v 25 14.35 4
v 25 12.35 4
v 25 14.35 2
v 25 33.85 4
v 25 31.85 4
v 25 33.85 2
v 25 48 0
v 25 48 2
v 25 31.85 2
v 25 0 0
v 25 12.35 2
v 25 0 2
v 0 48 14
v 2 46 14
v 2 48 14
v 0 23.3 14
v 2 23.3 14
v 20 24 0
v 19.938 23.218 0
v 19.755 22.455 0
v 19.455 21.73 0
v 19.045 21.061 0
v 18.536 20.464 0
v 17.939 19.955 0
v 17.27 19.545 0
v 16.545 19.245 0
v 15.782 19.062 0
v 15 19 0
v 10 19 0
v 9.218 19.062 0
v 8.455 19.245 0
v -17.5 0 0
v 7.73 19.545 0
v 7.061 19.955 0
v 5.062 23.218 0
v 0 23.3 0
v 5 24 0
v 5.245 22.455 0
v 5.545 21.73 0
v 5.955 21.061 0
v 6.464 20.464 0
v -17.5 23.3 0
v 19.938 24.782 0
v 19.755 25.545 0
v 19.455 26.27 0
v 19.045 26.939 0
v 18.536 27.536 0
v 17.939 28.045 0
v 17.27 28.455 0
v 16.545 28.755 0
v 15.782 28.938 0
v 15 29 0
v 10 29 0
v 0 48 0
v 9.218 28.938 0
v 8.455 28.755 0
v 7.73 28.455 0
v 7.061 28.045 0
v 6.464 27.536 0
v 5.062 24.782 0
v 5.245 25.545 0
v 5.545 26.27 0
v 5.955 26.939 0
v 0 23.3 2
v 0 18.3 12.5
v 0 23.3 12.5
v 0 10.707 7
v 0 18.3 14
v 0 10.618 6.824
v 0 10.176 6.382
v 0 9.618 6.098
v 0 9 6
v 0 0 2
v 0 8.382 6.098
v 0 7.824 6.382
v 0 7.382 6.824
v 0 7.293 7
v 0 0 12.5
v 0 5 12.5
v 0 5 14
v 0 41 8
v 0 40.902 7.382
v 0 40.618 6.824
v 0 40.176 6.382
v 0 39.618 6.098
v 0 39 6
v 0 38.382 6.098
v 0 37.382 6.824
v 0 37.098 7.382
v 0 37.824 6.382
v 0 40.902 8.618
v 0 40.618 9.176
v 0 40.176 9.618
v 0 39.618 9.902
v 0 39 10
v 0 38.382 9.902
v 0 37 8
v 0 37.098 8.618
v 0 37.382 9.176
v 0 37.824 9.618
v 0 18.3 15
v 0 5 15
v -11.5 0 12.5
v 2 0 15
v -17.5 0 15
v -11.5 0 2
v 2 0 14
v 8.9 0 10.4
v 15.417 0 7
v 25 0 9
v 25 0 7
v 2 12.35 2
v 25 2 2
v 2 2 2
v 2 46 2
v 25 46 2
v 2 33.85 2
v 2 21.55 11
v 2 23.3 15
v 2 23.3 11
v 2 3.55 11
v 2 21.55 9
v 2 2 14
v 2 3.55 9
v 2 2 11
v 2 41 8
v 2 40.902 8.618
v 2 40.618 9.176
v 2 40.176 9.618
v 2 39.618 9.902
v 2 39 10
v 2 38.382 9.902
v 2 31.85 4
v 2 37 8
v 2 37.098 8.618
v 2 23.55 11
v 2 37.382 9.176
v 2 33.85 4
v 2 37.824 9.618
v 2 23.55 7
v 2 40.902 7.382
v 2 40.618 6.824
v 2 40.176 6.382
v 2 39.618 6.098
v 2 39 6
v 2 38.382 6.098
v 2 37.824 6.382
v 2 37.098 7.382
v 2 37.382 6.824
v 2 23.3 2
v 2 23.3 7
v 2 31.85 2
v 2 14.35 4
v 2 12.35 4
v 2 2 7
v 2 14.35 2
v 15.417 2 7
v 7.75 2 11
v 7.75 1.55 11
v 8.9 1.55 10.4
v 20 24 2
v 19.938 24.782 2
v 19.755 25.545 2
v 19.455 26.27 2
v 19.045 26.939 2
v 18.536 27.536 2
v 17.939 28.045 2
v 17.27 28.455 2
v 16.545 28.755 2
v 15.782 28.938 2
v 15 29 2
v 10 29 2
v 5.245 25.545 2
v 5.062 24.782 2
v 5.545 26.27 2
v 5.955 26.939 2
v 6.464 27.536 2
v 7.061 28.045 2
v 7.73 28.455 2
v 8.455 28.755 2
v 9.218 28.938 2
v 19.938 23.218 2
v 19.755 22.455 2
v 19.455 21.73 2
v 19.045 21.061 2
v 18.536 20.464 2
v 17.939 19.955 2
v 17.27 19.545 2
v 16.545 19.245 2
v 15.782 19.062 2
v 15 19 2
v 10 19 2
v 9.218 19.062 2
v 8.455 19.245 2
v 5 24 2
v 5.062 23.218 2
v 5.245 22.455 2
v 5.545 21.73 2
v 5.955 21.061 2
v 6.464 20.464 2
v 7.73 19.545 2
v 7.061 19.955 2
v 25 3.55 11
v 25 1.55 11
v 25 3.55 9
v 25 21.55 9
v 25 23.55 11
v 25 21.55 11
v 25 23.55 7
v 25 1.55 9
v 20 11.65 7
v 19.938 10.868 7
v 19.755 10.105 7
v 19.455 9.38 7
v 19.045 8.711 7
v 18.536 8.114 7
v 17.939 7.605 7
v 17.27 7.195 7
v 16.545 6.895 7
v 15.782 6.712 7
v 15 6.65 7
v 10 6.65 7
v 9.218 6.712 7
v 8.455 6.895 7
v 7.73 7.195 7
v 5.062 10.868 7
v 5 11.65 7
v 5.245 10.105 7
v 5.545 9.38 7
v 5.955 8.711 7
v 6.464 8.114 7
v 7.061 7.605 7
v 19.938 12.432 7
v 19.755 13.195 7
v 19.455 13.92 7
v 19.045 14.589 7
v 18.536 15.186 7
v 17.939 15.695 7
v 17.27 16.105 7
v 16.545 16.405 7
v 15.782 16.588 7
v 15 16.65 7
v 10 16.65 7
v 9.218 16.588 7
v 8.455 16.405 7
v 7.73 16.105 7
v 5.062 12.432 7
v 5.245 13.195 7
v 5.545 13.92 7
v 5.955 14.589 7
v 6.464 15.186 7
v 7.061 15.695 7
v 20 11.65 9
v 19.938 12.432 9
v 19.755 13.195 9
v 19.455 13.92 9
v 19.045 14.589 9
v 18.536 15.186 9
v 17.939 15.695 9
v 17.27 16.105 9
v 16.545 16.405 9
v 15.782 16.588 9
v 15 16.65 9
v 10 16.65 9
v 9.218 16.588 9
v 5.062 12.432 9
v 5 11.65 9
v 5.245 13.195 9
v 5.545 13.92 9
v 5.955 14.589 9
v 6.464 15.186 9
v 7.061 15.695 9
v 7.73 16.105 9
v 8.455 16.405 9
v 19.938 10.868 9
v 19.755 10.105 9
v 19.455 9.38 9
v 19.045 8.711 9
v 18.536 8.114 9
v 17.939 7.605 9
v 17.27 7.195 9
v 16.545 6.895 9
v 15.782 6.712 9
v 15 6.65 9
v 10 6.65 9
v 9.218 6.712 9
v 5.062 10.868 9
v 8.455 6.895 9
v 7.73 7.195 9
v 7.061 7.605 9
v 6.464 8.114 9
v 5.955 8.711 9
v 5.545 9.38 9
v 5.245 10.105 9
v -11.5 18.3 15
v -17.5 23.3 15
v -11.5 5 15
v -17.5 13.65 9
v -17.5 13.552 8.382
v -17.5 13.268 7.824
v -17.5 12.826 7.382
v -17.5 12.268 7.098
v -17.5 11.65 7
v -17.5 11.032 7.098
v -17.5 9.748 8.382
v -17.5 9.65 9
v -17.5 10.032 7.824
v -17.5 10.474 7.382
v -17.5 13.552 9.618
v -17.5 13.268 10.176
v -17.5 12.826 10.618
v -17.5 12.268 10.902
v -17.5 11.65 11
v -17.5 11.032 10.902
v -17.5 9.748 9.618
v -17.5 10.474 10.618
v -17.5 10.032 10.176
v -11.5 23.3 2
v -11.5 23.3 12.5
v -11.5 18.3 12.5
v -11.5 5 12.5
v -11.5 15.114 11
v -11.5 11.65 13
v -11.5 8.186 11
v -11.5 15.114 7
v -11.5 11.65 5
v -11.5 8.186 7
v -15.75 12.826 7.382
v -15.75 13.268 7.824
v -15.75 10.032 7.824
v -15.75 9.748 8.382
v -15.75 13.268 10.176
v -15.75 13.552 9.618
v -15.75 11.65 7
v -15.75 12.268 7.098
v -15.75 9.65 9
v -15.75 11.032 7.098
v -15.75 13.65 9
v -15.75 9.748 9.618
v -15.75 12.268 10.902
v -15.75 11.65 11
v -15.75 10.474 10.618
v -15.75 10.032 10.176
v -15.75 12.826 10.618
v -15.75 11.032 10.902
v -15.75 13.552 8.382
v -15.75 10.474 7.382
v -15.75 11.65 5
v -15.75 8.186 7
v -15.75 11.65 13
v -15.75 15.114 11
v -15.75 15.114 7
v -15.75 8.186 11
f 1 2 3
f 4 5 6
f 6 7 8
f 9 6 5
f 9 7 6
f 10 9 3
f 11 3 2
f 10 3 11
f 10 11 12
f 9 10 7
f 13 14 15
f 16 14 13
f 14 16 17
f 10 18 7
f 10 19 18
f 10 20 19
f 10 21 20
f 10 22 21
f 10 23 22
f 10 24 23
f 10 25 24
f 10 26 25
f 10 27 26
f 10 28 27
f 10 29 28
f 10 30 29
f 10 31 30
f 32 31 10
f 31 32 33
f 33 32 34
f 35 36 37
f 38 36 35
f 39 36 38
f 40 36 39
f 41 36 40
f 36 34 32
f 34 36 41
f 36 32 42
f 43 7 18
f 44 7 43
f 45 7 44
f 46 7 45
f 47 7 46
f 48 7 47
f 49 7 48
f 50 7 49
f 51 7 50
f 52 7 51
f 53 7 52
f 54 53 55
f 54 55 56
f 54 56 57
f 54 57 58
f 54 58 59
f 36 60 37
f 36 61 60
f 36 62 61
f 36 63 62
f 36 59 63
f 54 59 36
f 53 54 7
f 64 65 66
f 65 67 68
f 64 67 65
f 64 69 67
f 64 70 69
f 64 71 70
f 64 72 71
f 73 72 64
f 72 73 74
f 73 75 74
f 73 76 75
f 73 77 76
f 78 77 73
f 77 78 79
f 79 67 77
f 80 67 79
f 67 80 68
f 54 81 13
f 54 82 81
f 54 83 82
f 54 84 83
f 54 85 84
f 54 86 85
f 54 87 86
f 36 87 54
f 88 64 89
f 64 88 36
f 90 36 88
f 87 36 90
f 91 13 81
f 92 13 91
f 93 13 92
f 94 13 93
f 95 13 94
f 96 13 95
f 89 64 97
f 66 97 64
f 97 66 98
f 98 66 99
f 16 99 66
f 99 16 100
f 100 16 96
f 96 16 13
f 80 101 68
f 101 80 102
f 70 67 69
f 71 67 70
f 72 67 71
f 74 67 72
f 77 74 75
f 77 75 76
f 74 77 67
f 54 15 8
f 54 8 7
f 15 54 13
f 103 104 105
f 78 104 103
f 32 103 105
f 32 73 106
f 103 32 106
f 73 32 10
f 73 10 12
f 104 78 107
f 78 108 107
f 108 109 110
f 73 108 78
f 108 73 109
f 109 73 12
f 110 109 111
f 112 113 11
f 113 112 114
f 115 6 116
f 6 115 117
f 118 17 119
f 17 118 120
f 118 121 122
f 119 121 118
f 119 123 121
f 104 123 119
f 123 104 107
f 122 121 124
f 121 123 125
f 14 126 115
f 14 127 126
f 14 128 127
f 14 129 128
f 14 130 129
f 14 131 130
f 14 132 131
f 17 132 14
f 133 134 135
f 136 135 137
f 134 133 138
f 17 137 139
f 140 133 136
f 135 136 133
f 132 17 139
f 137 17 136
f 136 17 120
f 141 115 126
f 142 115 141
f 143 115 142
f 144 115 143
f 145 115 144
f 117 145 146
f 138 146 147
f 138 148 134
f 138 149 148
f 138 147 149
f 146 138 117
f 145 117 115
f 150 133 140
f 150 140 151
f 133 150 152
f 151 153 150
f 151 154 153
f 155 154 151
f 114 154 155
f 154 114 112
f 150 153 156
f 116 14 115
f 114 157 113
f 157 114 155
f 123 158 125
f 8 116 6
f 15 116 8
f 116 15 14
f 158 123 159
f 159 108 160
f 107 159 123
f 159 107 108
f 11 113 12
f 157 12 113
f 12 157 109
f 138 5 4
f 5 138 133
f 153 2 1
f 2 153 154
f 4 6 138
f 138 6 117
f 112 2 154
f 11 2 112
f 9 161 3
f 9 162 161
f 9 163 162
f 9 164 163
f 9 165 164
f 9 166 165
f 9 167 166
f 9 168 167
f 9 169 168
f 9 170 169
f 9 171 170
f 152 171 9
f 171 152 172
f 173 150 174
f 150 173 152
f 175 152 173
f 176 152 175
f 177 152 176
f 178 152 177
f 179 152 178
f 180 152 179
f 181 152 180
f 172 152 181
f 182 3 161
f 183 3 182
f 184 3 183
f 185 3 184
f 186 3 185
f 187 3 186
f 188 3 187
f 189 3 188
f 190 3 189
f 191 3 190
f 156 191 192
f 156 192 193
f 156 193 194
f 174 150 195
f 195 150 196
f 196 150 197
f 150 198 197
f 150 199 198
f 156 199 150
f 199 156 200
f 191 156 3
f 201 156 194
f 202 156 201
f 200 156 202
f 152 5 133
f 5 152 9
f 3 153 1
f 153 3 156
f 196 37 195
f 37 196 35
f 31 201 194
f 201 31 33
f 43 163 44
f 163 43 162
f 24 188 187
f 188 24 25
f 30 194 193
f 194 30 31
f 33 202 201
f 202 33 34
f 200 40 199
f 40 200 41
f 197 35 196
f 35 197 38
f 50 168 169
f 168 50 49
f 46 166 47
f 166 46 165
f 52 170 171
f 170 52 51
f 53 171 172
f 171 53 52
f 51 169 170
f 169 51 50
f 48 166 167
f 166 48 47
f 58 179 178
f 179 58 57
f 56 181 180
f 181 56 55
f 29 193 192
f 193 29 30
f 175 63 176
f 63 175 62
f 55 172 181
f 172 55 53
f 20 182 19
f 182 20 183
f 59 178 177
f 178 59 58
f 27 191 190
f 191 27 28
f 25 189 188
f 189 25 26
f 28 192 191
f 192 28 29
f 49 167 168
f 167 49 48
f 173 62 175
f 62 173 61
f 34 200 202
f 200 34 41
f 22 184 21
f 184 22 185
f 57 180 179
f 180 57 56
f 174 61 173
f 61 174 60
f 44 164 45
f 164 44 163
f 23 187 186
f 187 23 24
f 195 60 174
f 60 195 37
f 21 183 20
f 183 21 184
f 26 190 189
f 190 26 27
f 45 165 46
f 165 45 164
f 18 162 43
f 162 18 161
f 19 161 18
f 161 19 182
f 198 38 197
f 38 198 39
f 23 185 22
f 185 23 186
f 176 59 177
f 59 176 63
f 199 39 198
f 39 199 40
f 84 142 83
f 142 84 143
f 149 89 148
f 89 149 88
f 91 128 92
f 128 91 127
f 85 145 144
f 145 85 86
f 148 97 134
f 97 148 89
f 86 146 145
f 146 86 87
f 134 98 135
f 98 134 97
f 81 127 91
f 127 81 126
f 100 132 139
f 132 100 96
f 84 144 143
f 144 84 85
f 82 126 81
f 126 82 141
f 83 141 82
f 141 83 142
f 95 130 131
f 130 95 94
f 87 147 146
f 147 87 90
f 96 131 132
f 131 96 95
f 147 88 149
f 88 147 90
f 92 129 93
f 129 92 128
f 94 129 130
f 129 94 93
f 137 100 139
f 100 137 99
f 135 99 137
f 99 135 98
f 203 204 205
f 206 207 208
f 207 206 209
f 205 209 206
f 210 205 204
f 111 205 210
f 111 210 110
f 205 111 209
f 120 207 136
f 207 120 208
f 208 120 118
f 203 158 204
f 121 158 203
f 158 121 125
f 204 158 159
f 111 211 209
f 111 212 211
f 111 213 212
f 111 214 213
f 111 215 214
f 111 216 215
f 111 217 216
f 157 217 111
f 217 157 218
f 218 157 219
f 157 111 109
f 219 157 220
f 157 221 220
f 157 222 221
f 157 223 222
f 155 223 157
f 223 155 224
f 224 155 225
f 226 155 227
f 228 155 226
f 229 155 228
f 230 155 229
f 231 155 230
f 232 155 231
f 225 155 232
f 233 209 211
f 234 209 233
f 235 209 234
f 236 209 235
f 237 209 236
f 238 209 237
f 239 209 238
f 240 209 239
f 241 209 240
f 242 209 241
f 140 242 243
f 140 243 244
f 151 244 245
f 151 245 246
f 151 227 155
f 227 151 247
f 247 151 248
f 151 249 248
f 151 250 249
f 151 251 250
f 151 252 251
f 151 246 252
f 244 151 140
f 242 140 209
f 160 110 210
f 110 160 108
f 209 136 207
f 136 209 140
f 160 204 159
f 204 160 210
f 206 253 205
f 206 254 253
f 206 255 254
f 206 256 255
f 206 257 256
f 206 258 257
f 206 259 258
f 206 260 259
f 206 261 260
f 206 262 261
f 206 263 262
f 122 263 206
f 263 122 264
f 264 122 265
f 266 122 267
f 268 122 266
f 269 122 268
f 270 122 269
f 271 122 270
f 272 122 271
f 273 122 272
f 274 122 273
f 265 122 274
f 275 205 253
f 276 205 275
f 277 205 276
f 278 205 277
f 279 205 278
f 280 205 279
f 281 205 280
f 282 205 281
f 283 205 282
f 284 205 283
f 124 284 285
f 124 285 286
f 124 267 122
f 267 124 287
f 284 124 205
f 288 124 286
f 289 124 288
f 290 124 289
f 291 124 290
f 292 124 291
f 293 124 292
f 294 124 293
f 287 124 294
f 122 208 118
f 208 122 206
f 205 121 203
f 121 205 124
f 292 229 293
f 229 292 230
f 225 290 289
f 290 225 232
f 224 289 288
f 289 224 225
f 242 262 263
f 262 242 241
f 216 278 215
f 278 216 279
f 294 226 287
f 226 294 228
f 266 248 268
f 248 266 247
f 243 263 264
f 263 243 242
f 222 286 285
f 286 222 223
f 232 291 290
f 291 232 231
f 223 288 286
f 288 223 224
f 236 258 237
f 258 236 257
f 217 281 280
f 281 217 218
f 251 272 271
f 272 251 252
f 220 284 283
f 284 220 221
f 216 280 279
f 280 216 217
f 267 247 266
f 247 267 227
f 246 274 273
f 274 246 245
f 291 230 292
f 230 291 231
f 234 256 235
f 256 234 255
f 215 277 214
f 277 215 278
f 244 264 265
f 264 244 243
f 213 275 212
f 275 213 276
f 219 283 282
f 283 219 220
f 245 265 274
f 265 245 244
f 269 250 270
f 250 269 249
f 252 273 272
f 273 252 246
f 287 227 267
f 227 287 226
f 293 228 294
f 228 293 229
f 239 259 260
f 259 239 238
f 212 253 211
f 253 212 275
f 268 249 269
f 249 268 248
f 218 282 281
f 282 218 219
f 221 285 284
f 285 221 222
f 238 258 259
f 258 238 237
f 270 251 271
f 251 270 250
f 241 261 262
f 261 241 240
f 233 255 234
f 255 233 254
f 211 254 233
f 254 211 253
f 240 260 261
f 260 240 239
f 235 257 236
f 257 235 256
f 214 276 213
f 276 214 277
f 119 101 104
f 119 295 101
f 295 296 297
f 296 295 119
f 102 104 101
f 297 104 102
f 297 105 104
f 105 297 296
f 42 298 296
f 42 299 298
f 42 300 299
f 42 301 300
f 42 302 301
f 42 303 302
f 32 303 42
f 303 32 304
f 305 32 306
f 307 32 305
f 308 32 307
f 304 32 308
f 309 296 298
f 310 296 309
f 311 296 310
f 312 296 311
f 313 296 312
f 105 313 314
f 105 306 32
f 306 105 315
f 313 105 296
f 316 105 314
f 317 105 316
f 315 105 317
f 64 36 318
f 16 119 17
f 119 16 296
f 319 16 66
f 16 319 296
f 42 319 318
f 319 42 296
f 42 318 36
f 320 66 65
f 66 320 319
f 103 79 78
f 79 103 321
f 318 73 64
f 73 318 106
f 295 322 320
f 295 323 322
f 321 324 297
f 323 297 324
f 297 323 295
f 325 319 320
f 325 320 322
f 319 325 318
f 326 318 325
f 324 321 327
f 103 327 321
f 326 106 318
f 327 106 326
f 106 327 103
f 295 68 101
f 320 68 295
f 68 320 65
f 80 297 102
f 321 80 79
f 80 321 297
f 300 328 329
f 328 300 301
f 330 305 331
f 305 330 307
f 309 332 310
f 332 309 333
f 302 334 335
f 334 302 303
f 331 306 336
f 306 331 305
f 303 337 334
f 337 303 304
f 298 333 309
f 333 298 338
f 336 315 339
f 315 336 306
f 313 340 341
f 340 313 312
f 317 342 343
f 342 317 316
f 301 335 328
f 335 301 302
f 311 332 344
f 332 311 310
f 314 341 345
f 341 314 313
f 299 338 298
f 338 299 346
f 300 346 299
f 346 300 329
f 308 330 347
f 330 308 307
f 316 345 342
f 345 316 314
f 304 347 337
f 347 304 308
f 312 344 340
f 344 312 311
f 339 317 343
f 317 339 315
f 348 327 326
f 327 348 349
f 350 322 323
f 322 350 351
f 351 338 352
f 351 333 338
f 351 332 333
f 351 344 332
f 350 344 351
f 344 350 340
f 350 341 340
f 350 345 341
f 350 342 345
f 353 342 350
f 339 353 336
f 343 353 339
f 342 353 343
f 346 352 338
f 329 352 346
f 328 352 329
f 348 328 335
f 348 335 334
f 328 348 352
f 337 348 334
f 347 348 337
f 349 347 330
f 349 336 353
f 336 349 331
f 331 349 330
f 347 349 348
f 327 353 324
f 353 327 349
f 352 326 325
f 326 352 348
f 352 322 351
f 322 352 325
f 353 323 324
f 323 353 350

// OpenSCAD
// file: ../basic_scad/tolerance.scad
// Author: Mihai Oltean, https://mihaioltean.github.io, mihai.oltean@gmail.com
// More details: jenny5.org
// Source: github.com/jenny5-robot
// MIT License
//--------------------------------------------------------------

tolerance = 0.1;
display_tolerance = 1;

overlap_tolerance = 0.01;

tolerance_z = [0, 0, tolerance];
tolerance_x = [tolerance, 0, 0];
tolerance_y = [0, tolerance, 0];

display_tolerance_z = [0, 0, display_tolerance];
display_tolerance_x = [display_tolerance, 0, 0];
display_tolerance_y = [0, display_tolerance, 0];

display_tolerance_xz = [display_tolerance, 0, display_tolerance];
display_tolerance_xy = [display_tolerance, display_tolerance, 0];
display_tolerance_yz = [0, display_tolerance, display_tolerance];

display_tolerance_xyz = [display_tolerance, display_tolerance, display_tolerance];
// file: ../basic_scad/params_screws_nuts_washers.scad
// Author: Mihai Oltean, www.tcreate.org, mihai.oltean@gmail.com
// More details: jenny5.org
// Source: github.com/jenny5-robot
// MIT License
//--------------------------------------------------------------


m2_screw_radius = 1;
m2_nut_radius = 2.2;
m2_nut_height = 1.6;
m2_nut_thick = m2_nut_height;

m3_screw_radius = 1.5;
m3_nut_radius = 3.1;
m3_nut_height = 2.3;
m3_nut_thick = m3_nut_height;
m3_autolock_nut_thick = 4.2;

m4_screw_radius = 2;
m4_nut_radius = 4;
m4_auto_lock_nut_height = 5;
m4_nut_height = 3.25;
m4_nut_thick = 3.25;

m5_screw_radius = 2.5;
m5_nut_radius = 4.6;
m5_nut_height = 4;

m6_screw_radius = 3;
m6_nut_radius = 5.65;
m6_nut_thick = 5;
m6_nut_slim_thick = 3;
m6_autolock_nut_thick = 6;
m6_long_nut_thick = 9;

m8_screw_head_height = 5.7;
m8_screw_radius = 3.9;
m8_nut_small_width = 12.8;
m8_nut_radius = 7.3;
m8_slim_nut_small_width = 12.4;
m8_nut_thick = 6.5;
m8_nut_height = m8_nut_thick;
m8_slim_nut_height = 5.5;
m8_screw_head_radius = 6.5;
m8_autolock_nut_thick = 8;

m10_screw_radius = 5;
m10_nut_thick = 8;
m10_nut_radius = 9.8;

M12_screw_radius = 6;
M12_nut_thick = 10;
M12_nut_radius = 11;
M12_long_long_nut_thick = 36;
M12_long_nut_thick = 36;
M12_autolock_nut_thick = 14;

m10_long_nut_radius = 9.71;
m10_long_nut_height = 29.8;

m10_long_thick_nut_radius = 7.41;
m10_long_thick_nut_height = 30.4;

m12_plastic_nut_radius = 10.45;
m12_plastic_nut_height = 23.3;

tr12_3_nut_radius = 11;
tr12_3_nut_height = 18.1;

washer_5 = 0.97;

washer_4_12_radius = 6;
washer_4_12_external_radius = 6;
washer_4_12_thick = 1;
washer_4_thick = 1;
washer_4_12_internal_radius = 2.15;

washer_4_9_external_radius = 4.5;
washer_4_9_internal_radius = 2.15;
washer_4_9_thick = 1;

washer_6_thick = 1.7;
washer_8_thick = 1.5;
washer_5_thick = 1;

washer_10_height = 2;
washer_10_thick = 2;

washer_12_thick = 2;

washer_5_15_external_radius = 7.5;
washer_5_15_thick = 1;
washer_5_thick = 1;
washer_5_15_internal_radius = 2.65;
// file: ../basic_scad/params_potentiometers.scad
// Author: Mihai Oltean, www.tcreate.org, mihai.oltean@gmail.com
// More details: jenny5.org
// Source: github.com/jenny5-robot
// MIT License
//--------------------------------------------------------------

pot_92R1A_J22_L15L_base_length = 17.5;
pot_92R1A_J22_L15L_base_width = 16;
pot_92R1A_J22_L15L_base_height = 12.6;

pot_92R1A_J22_L15L_base_shaft_radius = 5;
pot_92R1A_J22_L15L_base_shaft_length = 9;
pot_92R1A_J22_L15L_shaft_radius = 3;
pot_92R1A_J22_L15L_shaft_length = 13;

pot_BOURNS_3852A_282_103AL_base_radius = 9.5;
pot_BOURNS_3852A_282_103AL_base_height = 7;

pot_BOURNS_3852A_282_103AL_base_shaft_radius = 5;
pot_BOURNS_3852A_282_103AL_base_shaft_length = 9;
pot_BOURNS_3852A_282_103AL_shaft_radius = 3;
pot_BOURNS_3852A_282_103AL_shaft_length = 13;
// file: ../basic_scad/potentiometers.scad
// Author: Mihai Oltean, www.tcreate.org, mihai.oltean@gmail.com
// More details: jenny5.org
// Source: github.com/jenny5-robot
// MIT License
//--------------------------------------------------------------

include <params_potentiometers.scad>
include <tolerance.scad>

//--------------------------------------------------------------
module potentiometer_rectangular(base_length, base_width, base_height, base_shaft_radius, base_shaft_length, shaft_radius, shaft_length)
{
    color("blue") translate([- base_length / 2, - base_width / 2, 0])
        cube([base_length, base_width, base_height]);
    color("grey") translate ([0, 0, base_height]) cylinder (h = base_shaft_length, r = base_shaft_radius, $fn = 30);
    color("grey") translate ([0, 0, base_height + base_shaft_length]) cylinder (h = shaft_length, r = shaft_radius, $fn = 30);
}
//--------------------------------------------------------------
module potentiometer_circular(base_radius, base_height, base_shaft_radius, base_shaft_length, shaft_radius, shaft_length)
{
    color("blue") cylinder (r = base_radius, h = base_height);
    color("grey") translate ([0, 0, base_height]) cylinder (h = base_shaft_length, r = base_shaft_radius, $fn = 30);
    color("grey") translate ([0, 0, base_height + base_shaft_length]) cylinder (h = shaft_length, r = shaft_radius, $fn = 30);
}
//--------------------------------------------------------------
module potentiometer_92R1A_J22_L15L()
{
    potentiometer_rectangular(pot_92R1A_J22_L15L_base_length, pot_92R1A_J22_L15L_base_width, pot_92R1A_J22_L15L_base_height, pot_92R1A_J22_L15L_base_shaft_radius, pot_92R1A_J22_L15L_base_shaft_length, pot_92R1A_J22_L15L_shaft_radius, pot_92R1A_J22_L15L_shaft_length);
}

//--------------------------------------------------------------
module potentiometer_BOURNS_3852A_282_103AL()
{
    potentiometer_circular(pot_BOURNS_3852A_282_103AL_base_radius, pot_BOURNS_3852A_282_103AL_base_height, pot_BOURNS_3852A_282_103AL_base_shaft_radius, pot_BOURNS_3852A_282_103AL_base_shaft_length, pot_BOURNS_3852A_282_103AL_shaft_radius, pot_BOURNS_3852A_282_103AL_shaft_length);
}

//--------------------------------------------------------------
potentiometer_92R1A_J22_L15L();

//potentiometer_BOURNS_3852A_282_103AL();
// file: ../basic_scad/potentiometer_support.scad
// Author: Mihai Oltean, www.tcreate.org, mihai.oltean@gmail.com
// More details: jenny5.org
// Source: github.com/jenny5-robot
// MIT License
//--------------------------------------------------------------

include <params_screws_nuts_washers.scad>
include <params_basic_components.scad>
include <tolerance.scad>

//---------------------------------------------------------------------------
module potentiometer_support(length, width, height, dist_to_hole = 10, hole_tolerance = 5, wall_thick = 2)
{
  difference(){
    cube([length, width, height]);
      
    translate ([2, wall_thick, 2])  cube([length, width - 2 * wall_thick, height + 1]);
    //translate ([wall_thick, wall_thick, -1])  cube([length, width - 2 * wall_thick, bottom_wall + 1]);
    translate ([2, 0, height] - display_tolerance_y)  rotate ([0, atan((height - 2) / (length - wall_thick)), 0]) cube([length + sqrt(length), width + 2 * display_tolerance, height + 1]);
    
      // potentiometer hole
    hull(){
       translate ([2 + dist_to_hole, width / 2, 0] - display_tolerance_z) cylinder (h = 5, r = 4.9, $fn = 40);
       translate ([2 + dist_to_hole + hole_tolerance, width / 2, 0] - display_tolerance_z) cylinder (h = 5, r = 4.9, $fn = 40);
    }
  }
}
//---------------------------------------------------------------------------
module potentiometer_support_squared(length, width, height, dist_to_hole = 8, hole_tolerance = 5, wall_thick = 2, pot_width = 16, stopper_shift = 0.9)
{
  difference(){
    union(){
      difference(){
        cube([length, width, height]);
        translate ([2, wall_thick, 2])  cube([length, width - 2 * wall_thick, height + 1]);
        translate ([2, 0, height] - display_tolerance_y)  rotate ([0, atan((height - 2) / (length - wall_thick)), 0]) cube([length + sqrt(length), width + 2 * display_tolerance, height + 1]);
      }
        // stopper for potentiometer
      translate ([0, width / 2 - pot_width / 2 - 2 - stopper_shift, 0]) cube([length, pot_width + 4, 4]);
    }
    // potentiometer slide hole
    translate ([2, width / 2 - pot_width / 2 - stopper_shift, 2]) cube([length, pot_width, height]);
      // potentiometer screw hole
    hull(){
       translate ([2 + dist_to_hole, width / 2, 0] - display_tolerance_z) cylinder (h = 5, r = 5, $fn = 40);
       translate ([2 + dist_to_hole + hole_tolerance, width / 2, 0] - display_tolerance_z) cylinder (h = 5, r = 5, $fn = 40);
    }
  }
}
//---------------------------------------------------------------------------
module potentiometer_support_with_screw_holes(length, width, height, dist_between_support_holes, dist_to_support_holes = 5)
{
    difference(){
      potentiometer_support(length, width, height);
        translate ([0, width / 2 - dist_between_support_holes / 2, 2 + dist_to_support_holes] - display_tolerance_x) rotate([0, 90, 0]) cylinder (h = 2 + 2 * display_tolerance, r = m4_screw_radius, $fn = 20);
        translate ([0, width / 2 + dist_between_support_holes / 2, 2 + dist_to_support_holes] - display_tolerance_x) rotate([0, 90, 0]) cylinder (h = 2 + 2 * display_tolerance, r = m4_screw_radius, $fn = 20);
    }
}
//---------------------------------------------------------------------------
module potentiometer_support_squared_with_screw_holes(length, width, height, dist_between_support_holes, dist_to_support_holes = 5, stopper_shift = 0)
{
    difference(){
      potentiometer_support_squared(length, width, height, pot_width = 17.5, stopper_shift = 0.9);
        translate ([0, width / 2 - dist_between_support_holes / 2, 2 + dist_to_support_holes] - display_tolerance_x) rotate([0, 90, 0]) cylinder (h = 2 + 2 * display_tolerance, r = m4_screw_radius, $fn = 20);
        translate ([0, width / 2 + dist_between_support_holes / 2, 2 + dist_to_support_holes] - display_tolerance_x) rotate([0, 90, 0]) cylinder (h = 2 + 2 * display_tolerance, r = m4_screw_radius, $fn = 20);
    }
}
//---------------------------------------------------------------------------
module rectangular_axis_slider(height, wall_thick = 3, hole_depth = 10.5, hole_width = 10.5)
{
    width = 2 * wall_thick + hole_width + 4;
    
            difference(){
              cube([height, width, hole_depth + 2 * wall_thick - 0.5]);
              translate([0, wall_thick, 3.5] - display_tolerance_x) cube([height + 2 * display_tolerance, hole_width, hole_depth]); 
              translate([height / 2 - 4, wall_thick, 3.5]) cube([8, hole_width, hole_depth + wall_thick] + display_tolerance_z); 
                
             // screw hole   
              translate([height / 2, width, wall_thick + hole_depth / 2]) rotate ([90, 0, 0]) cylinder (h = 10, r = m4_screw_radius, $fn = 20);
                // nut hole
                translate([height / 2, width - 3, wall_thick + hole_depth / 2]) rotate ([90, 30, 0]) cylinder (h = 10, r = m4_nut_radius, $fn = 6);
            }
}
//---------------------------------------------------------------------------
module rounded_axis_slider(height, wall_thick = 3, hole_radius = 6)
{
  width = 2 * wall_thick + 2 * hole_radius;
    
  difference(){
    cube([height, width, width]);
        // shaft hole
    translate([0, wall_thick + hole_radius, wall_thick + hole_radius] - display_tolerance_x) rotate ([0, 90, 0]) cylinder( h = height + 2 * display_tolerance, r = hole_radius, $fn = 40); 
                
    // screw hole   
    translate([height / 2, hole_radius, 0] - display_tolerance_z) cylinder (h = wall_thick + 2, r = m4_screw_radius, $fn = 20);
    // nut hole
      hull(){
    //translate([height / 2, width, 3]) rotate([0, 0, 30]) cylinder (h = m4_nut_thick, r = m4_nut_radius, $fn = 6);
    translate([height / 2, hole_radius, 2.5]) rotate([0, 0, 30]) cylinder (h = m4_nut_thick + 2, r = m4_nut_radius, $fn = 6);
      }
  }
}
//---------------------------------------------------------------------------
module potentiometer_support_on_rectangular_axis(length, width, potentiometer_height, box_height, vertical_distance_to_potentiometer = 0, _stopper_shift = -0.9)
{
    hole_depth = 11.5;
    hole_width = 10.5;
    union(){
        // potentiometer
      translate ([0, 0, vertical_distance_to_potentiometer]) potentiometer_support_squared(length, width, potentiometer_height, pot_width = 18, stopper_shift = _stopper_shift);
      // bone housing
      translate ([-(hole_depth + 6), 0, 0]) 
        difference(){
          cube([hole_depth + 8, width, box_height]);
          translate([6, 0, 2] - display_tolerance_y) cube([hole_depth, width + 2 * display_tolerance, hole_width]); 
          translate([6, 5, 2]) cube([hole_depth, width -10, 20]); 
                
          // screw hole
          translate([0, width / 2, 9] - display_tolerance_x) rotate ([0, 90, 0]) cylinder (h = 10, r = m4_screw_radius, $fn = 20);
          // nut hole
          translate([6 - m4_nut_thick, width / 2, 9] - display_tolerance_x) rotate ([0, 90, 0]) cylinder (h = 5, r = m4_nut_radius, $fn = 6);
        }
    }
}
//---------------------------------------------------------------------------
//potentiometer_support(length = 40, width = 20, height = 4, dist_to_hole = 10, hole_tolerance = 15, wall_thick = 2);

//potentiometer_support_with_screw_holes(25, 48, 13, 29);

//potentiometer_support_on_rectangular_axis(length = 25, width = 23.3, potentiometer_height = 4, box_height = 15, vertical_distance_to_potentiometer = 4, stopper_shift = -0.9);

//rectangular_axis_slider(20);

//rounded_axis_slider(height = 30, wall_thick = 3, hole_depth = 10.5, hole_width = 10.5);

//potentiometer_support(27, 28, 5, 10, 5, 3, 0);

//potentiometer_support_squared(length = 27, width = 28, height = 5, dist_to_hole = 10, hole_tolerance = 15, wall_thick = 3, pot_width = 16, stopper_shift = 0.0);

potentiometer_support_squared_with_screw_holes(length = 25, width = 48, height = 13, dist_between_support_holes = 30, dist_to_support_holes = 5, stopper_shift = 0);
// file: ../basic_scad/params_basic_components.scad
// Author: Mihai Oltean, https://mihaioltean.github.io, mihai.oltean@gmail.com
// More details: jenny5.org
// Source: github.com/jenny5-robot
// MIT License
//--------------------------------------------------------------

spring_length = 20;

smooth_rod_8_radius = 4;
smooth_rod_10_radius = 5;
smooth_rod_12_radius = 6;

wall_thick_1 = 1;
wall_thick_2 = 2;
wall_thick_3 = 3;
wall_thick_4 = 4;
wall_thick_5 = 5;
wall_thick_5_5 = 5.5;
wall_thick_6 = 6;
wall_thick_7 = 7;
wall_thick_8 = 8;
wall_thick_9 = 9;
wall_thick_10 = 10;
wall_thick_12 = 12;
// main file
// Author: Mihai Oltean, https://mihaioltean.github.io, mihai.oltean@gmail.com
// More details: http://jenny5.org, https://jenny5-robot.github.io/
// Source: github.com/jenny5-robot
// MIT License
//--------------------------------------------------------------
include <../basic_scad/params_basic_components.scad>
use <../basic_scad/potentiometer_support.scad>
use <../basic_scad/potentiometers.scad>
include <../basic_scad/params_potentiometers.scad>

//--------------------------------------------------------------
module potentiometer_support_shoulder_vertical()
{
    potentiometer_support_squared_with_screw_holes(length = 25, width = 48, height = 14, dist_between_support_holes = 30, dist_to_support_holes = 6);
}
//---------------------------------------------------------------------------
module potentiometer_support_motor1()
{
    length = pot_92R1A_J22_L15L_base_width + 2 * wall_thick_2;
}
//---------------------------------------------------------------------------
module elbow_potentiometer_support()
{
    potentiometer_support_on_rectangular_axis(length = 25, width = 23.3, potentiometer_height = 4, box_height = 15, vertical_distance_to_potentiometer = 7, _stopper_shift = -0.9);
}
//---------------------------------------------------------------------------
module shoulder_potentiometer_support()
{
potentiometer_support_squared_with_screw_holes(length = 25, width = 42, height = 13, dist_between_support_holes = 30, dist_to_support_holes = 5, stopper_shift = 0);
}
//---------------------------------------------------------------------------
module forearm_potentiometer_support()
{
    potentiometer_support_with_screw_holes(30, 30, 10, 29, 8);
}
//---------------------------------------------------------------------------


potentiometer_support_shoulder_vertical();
elbow_potentiometer_support();
